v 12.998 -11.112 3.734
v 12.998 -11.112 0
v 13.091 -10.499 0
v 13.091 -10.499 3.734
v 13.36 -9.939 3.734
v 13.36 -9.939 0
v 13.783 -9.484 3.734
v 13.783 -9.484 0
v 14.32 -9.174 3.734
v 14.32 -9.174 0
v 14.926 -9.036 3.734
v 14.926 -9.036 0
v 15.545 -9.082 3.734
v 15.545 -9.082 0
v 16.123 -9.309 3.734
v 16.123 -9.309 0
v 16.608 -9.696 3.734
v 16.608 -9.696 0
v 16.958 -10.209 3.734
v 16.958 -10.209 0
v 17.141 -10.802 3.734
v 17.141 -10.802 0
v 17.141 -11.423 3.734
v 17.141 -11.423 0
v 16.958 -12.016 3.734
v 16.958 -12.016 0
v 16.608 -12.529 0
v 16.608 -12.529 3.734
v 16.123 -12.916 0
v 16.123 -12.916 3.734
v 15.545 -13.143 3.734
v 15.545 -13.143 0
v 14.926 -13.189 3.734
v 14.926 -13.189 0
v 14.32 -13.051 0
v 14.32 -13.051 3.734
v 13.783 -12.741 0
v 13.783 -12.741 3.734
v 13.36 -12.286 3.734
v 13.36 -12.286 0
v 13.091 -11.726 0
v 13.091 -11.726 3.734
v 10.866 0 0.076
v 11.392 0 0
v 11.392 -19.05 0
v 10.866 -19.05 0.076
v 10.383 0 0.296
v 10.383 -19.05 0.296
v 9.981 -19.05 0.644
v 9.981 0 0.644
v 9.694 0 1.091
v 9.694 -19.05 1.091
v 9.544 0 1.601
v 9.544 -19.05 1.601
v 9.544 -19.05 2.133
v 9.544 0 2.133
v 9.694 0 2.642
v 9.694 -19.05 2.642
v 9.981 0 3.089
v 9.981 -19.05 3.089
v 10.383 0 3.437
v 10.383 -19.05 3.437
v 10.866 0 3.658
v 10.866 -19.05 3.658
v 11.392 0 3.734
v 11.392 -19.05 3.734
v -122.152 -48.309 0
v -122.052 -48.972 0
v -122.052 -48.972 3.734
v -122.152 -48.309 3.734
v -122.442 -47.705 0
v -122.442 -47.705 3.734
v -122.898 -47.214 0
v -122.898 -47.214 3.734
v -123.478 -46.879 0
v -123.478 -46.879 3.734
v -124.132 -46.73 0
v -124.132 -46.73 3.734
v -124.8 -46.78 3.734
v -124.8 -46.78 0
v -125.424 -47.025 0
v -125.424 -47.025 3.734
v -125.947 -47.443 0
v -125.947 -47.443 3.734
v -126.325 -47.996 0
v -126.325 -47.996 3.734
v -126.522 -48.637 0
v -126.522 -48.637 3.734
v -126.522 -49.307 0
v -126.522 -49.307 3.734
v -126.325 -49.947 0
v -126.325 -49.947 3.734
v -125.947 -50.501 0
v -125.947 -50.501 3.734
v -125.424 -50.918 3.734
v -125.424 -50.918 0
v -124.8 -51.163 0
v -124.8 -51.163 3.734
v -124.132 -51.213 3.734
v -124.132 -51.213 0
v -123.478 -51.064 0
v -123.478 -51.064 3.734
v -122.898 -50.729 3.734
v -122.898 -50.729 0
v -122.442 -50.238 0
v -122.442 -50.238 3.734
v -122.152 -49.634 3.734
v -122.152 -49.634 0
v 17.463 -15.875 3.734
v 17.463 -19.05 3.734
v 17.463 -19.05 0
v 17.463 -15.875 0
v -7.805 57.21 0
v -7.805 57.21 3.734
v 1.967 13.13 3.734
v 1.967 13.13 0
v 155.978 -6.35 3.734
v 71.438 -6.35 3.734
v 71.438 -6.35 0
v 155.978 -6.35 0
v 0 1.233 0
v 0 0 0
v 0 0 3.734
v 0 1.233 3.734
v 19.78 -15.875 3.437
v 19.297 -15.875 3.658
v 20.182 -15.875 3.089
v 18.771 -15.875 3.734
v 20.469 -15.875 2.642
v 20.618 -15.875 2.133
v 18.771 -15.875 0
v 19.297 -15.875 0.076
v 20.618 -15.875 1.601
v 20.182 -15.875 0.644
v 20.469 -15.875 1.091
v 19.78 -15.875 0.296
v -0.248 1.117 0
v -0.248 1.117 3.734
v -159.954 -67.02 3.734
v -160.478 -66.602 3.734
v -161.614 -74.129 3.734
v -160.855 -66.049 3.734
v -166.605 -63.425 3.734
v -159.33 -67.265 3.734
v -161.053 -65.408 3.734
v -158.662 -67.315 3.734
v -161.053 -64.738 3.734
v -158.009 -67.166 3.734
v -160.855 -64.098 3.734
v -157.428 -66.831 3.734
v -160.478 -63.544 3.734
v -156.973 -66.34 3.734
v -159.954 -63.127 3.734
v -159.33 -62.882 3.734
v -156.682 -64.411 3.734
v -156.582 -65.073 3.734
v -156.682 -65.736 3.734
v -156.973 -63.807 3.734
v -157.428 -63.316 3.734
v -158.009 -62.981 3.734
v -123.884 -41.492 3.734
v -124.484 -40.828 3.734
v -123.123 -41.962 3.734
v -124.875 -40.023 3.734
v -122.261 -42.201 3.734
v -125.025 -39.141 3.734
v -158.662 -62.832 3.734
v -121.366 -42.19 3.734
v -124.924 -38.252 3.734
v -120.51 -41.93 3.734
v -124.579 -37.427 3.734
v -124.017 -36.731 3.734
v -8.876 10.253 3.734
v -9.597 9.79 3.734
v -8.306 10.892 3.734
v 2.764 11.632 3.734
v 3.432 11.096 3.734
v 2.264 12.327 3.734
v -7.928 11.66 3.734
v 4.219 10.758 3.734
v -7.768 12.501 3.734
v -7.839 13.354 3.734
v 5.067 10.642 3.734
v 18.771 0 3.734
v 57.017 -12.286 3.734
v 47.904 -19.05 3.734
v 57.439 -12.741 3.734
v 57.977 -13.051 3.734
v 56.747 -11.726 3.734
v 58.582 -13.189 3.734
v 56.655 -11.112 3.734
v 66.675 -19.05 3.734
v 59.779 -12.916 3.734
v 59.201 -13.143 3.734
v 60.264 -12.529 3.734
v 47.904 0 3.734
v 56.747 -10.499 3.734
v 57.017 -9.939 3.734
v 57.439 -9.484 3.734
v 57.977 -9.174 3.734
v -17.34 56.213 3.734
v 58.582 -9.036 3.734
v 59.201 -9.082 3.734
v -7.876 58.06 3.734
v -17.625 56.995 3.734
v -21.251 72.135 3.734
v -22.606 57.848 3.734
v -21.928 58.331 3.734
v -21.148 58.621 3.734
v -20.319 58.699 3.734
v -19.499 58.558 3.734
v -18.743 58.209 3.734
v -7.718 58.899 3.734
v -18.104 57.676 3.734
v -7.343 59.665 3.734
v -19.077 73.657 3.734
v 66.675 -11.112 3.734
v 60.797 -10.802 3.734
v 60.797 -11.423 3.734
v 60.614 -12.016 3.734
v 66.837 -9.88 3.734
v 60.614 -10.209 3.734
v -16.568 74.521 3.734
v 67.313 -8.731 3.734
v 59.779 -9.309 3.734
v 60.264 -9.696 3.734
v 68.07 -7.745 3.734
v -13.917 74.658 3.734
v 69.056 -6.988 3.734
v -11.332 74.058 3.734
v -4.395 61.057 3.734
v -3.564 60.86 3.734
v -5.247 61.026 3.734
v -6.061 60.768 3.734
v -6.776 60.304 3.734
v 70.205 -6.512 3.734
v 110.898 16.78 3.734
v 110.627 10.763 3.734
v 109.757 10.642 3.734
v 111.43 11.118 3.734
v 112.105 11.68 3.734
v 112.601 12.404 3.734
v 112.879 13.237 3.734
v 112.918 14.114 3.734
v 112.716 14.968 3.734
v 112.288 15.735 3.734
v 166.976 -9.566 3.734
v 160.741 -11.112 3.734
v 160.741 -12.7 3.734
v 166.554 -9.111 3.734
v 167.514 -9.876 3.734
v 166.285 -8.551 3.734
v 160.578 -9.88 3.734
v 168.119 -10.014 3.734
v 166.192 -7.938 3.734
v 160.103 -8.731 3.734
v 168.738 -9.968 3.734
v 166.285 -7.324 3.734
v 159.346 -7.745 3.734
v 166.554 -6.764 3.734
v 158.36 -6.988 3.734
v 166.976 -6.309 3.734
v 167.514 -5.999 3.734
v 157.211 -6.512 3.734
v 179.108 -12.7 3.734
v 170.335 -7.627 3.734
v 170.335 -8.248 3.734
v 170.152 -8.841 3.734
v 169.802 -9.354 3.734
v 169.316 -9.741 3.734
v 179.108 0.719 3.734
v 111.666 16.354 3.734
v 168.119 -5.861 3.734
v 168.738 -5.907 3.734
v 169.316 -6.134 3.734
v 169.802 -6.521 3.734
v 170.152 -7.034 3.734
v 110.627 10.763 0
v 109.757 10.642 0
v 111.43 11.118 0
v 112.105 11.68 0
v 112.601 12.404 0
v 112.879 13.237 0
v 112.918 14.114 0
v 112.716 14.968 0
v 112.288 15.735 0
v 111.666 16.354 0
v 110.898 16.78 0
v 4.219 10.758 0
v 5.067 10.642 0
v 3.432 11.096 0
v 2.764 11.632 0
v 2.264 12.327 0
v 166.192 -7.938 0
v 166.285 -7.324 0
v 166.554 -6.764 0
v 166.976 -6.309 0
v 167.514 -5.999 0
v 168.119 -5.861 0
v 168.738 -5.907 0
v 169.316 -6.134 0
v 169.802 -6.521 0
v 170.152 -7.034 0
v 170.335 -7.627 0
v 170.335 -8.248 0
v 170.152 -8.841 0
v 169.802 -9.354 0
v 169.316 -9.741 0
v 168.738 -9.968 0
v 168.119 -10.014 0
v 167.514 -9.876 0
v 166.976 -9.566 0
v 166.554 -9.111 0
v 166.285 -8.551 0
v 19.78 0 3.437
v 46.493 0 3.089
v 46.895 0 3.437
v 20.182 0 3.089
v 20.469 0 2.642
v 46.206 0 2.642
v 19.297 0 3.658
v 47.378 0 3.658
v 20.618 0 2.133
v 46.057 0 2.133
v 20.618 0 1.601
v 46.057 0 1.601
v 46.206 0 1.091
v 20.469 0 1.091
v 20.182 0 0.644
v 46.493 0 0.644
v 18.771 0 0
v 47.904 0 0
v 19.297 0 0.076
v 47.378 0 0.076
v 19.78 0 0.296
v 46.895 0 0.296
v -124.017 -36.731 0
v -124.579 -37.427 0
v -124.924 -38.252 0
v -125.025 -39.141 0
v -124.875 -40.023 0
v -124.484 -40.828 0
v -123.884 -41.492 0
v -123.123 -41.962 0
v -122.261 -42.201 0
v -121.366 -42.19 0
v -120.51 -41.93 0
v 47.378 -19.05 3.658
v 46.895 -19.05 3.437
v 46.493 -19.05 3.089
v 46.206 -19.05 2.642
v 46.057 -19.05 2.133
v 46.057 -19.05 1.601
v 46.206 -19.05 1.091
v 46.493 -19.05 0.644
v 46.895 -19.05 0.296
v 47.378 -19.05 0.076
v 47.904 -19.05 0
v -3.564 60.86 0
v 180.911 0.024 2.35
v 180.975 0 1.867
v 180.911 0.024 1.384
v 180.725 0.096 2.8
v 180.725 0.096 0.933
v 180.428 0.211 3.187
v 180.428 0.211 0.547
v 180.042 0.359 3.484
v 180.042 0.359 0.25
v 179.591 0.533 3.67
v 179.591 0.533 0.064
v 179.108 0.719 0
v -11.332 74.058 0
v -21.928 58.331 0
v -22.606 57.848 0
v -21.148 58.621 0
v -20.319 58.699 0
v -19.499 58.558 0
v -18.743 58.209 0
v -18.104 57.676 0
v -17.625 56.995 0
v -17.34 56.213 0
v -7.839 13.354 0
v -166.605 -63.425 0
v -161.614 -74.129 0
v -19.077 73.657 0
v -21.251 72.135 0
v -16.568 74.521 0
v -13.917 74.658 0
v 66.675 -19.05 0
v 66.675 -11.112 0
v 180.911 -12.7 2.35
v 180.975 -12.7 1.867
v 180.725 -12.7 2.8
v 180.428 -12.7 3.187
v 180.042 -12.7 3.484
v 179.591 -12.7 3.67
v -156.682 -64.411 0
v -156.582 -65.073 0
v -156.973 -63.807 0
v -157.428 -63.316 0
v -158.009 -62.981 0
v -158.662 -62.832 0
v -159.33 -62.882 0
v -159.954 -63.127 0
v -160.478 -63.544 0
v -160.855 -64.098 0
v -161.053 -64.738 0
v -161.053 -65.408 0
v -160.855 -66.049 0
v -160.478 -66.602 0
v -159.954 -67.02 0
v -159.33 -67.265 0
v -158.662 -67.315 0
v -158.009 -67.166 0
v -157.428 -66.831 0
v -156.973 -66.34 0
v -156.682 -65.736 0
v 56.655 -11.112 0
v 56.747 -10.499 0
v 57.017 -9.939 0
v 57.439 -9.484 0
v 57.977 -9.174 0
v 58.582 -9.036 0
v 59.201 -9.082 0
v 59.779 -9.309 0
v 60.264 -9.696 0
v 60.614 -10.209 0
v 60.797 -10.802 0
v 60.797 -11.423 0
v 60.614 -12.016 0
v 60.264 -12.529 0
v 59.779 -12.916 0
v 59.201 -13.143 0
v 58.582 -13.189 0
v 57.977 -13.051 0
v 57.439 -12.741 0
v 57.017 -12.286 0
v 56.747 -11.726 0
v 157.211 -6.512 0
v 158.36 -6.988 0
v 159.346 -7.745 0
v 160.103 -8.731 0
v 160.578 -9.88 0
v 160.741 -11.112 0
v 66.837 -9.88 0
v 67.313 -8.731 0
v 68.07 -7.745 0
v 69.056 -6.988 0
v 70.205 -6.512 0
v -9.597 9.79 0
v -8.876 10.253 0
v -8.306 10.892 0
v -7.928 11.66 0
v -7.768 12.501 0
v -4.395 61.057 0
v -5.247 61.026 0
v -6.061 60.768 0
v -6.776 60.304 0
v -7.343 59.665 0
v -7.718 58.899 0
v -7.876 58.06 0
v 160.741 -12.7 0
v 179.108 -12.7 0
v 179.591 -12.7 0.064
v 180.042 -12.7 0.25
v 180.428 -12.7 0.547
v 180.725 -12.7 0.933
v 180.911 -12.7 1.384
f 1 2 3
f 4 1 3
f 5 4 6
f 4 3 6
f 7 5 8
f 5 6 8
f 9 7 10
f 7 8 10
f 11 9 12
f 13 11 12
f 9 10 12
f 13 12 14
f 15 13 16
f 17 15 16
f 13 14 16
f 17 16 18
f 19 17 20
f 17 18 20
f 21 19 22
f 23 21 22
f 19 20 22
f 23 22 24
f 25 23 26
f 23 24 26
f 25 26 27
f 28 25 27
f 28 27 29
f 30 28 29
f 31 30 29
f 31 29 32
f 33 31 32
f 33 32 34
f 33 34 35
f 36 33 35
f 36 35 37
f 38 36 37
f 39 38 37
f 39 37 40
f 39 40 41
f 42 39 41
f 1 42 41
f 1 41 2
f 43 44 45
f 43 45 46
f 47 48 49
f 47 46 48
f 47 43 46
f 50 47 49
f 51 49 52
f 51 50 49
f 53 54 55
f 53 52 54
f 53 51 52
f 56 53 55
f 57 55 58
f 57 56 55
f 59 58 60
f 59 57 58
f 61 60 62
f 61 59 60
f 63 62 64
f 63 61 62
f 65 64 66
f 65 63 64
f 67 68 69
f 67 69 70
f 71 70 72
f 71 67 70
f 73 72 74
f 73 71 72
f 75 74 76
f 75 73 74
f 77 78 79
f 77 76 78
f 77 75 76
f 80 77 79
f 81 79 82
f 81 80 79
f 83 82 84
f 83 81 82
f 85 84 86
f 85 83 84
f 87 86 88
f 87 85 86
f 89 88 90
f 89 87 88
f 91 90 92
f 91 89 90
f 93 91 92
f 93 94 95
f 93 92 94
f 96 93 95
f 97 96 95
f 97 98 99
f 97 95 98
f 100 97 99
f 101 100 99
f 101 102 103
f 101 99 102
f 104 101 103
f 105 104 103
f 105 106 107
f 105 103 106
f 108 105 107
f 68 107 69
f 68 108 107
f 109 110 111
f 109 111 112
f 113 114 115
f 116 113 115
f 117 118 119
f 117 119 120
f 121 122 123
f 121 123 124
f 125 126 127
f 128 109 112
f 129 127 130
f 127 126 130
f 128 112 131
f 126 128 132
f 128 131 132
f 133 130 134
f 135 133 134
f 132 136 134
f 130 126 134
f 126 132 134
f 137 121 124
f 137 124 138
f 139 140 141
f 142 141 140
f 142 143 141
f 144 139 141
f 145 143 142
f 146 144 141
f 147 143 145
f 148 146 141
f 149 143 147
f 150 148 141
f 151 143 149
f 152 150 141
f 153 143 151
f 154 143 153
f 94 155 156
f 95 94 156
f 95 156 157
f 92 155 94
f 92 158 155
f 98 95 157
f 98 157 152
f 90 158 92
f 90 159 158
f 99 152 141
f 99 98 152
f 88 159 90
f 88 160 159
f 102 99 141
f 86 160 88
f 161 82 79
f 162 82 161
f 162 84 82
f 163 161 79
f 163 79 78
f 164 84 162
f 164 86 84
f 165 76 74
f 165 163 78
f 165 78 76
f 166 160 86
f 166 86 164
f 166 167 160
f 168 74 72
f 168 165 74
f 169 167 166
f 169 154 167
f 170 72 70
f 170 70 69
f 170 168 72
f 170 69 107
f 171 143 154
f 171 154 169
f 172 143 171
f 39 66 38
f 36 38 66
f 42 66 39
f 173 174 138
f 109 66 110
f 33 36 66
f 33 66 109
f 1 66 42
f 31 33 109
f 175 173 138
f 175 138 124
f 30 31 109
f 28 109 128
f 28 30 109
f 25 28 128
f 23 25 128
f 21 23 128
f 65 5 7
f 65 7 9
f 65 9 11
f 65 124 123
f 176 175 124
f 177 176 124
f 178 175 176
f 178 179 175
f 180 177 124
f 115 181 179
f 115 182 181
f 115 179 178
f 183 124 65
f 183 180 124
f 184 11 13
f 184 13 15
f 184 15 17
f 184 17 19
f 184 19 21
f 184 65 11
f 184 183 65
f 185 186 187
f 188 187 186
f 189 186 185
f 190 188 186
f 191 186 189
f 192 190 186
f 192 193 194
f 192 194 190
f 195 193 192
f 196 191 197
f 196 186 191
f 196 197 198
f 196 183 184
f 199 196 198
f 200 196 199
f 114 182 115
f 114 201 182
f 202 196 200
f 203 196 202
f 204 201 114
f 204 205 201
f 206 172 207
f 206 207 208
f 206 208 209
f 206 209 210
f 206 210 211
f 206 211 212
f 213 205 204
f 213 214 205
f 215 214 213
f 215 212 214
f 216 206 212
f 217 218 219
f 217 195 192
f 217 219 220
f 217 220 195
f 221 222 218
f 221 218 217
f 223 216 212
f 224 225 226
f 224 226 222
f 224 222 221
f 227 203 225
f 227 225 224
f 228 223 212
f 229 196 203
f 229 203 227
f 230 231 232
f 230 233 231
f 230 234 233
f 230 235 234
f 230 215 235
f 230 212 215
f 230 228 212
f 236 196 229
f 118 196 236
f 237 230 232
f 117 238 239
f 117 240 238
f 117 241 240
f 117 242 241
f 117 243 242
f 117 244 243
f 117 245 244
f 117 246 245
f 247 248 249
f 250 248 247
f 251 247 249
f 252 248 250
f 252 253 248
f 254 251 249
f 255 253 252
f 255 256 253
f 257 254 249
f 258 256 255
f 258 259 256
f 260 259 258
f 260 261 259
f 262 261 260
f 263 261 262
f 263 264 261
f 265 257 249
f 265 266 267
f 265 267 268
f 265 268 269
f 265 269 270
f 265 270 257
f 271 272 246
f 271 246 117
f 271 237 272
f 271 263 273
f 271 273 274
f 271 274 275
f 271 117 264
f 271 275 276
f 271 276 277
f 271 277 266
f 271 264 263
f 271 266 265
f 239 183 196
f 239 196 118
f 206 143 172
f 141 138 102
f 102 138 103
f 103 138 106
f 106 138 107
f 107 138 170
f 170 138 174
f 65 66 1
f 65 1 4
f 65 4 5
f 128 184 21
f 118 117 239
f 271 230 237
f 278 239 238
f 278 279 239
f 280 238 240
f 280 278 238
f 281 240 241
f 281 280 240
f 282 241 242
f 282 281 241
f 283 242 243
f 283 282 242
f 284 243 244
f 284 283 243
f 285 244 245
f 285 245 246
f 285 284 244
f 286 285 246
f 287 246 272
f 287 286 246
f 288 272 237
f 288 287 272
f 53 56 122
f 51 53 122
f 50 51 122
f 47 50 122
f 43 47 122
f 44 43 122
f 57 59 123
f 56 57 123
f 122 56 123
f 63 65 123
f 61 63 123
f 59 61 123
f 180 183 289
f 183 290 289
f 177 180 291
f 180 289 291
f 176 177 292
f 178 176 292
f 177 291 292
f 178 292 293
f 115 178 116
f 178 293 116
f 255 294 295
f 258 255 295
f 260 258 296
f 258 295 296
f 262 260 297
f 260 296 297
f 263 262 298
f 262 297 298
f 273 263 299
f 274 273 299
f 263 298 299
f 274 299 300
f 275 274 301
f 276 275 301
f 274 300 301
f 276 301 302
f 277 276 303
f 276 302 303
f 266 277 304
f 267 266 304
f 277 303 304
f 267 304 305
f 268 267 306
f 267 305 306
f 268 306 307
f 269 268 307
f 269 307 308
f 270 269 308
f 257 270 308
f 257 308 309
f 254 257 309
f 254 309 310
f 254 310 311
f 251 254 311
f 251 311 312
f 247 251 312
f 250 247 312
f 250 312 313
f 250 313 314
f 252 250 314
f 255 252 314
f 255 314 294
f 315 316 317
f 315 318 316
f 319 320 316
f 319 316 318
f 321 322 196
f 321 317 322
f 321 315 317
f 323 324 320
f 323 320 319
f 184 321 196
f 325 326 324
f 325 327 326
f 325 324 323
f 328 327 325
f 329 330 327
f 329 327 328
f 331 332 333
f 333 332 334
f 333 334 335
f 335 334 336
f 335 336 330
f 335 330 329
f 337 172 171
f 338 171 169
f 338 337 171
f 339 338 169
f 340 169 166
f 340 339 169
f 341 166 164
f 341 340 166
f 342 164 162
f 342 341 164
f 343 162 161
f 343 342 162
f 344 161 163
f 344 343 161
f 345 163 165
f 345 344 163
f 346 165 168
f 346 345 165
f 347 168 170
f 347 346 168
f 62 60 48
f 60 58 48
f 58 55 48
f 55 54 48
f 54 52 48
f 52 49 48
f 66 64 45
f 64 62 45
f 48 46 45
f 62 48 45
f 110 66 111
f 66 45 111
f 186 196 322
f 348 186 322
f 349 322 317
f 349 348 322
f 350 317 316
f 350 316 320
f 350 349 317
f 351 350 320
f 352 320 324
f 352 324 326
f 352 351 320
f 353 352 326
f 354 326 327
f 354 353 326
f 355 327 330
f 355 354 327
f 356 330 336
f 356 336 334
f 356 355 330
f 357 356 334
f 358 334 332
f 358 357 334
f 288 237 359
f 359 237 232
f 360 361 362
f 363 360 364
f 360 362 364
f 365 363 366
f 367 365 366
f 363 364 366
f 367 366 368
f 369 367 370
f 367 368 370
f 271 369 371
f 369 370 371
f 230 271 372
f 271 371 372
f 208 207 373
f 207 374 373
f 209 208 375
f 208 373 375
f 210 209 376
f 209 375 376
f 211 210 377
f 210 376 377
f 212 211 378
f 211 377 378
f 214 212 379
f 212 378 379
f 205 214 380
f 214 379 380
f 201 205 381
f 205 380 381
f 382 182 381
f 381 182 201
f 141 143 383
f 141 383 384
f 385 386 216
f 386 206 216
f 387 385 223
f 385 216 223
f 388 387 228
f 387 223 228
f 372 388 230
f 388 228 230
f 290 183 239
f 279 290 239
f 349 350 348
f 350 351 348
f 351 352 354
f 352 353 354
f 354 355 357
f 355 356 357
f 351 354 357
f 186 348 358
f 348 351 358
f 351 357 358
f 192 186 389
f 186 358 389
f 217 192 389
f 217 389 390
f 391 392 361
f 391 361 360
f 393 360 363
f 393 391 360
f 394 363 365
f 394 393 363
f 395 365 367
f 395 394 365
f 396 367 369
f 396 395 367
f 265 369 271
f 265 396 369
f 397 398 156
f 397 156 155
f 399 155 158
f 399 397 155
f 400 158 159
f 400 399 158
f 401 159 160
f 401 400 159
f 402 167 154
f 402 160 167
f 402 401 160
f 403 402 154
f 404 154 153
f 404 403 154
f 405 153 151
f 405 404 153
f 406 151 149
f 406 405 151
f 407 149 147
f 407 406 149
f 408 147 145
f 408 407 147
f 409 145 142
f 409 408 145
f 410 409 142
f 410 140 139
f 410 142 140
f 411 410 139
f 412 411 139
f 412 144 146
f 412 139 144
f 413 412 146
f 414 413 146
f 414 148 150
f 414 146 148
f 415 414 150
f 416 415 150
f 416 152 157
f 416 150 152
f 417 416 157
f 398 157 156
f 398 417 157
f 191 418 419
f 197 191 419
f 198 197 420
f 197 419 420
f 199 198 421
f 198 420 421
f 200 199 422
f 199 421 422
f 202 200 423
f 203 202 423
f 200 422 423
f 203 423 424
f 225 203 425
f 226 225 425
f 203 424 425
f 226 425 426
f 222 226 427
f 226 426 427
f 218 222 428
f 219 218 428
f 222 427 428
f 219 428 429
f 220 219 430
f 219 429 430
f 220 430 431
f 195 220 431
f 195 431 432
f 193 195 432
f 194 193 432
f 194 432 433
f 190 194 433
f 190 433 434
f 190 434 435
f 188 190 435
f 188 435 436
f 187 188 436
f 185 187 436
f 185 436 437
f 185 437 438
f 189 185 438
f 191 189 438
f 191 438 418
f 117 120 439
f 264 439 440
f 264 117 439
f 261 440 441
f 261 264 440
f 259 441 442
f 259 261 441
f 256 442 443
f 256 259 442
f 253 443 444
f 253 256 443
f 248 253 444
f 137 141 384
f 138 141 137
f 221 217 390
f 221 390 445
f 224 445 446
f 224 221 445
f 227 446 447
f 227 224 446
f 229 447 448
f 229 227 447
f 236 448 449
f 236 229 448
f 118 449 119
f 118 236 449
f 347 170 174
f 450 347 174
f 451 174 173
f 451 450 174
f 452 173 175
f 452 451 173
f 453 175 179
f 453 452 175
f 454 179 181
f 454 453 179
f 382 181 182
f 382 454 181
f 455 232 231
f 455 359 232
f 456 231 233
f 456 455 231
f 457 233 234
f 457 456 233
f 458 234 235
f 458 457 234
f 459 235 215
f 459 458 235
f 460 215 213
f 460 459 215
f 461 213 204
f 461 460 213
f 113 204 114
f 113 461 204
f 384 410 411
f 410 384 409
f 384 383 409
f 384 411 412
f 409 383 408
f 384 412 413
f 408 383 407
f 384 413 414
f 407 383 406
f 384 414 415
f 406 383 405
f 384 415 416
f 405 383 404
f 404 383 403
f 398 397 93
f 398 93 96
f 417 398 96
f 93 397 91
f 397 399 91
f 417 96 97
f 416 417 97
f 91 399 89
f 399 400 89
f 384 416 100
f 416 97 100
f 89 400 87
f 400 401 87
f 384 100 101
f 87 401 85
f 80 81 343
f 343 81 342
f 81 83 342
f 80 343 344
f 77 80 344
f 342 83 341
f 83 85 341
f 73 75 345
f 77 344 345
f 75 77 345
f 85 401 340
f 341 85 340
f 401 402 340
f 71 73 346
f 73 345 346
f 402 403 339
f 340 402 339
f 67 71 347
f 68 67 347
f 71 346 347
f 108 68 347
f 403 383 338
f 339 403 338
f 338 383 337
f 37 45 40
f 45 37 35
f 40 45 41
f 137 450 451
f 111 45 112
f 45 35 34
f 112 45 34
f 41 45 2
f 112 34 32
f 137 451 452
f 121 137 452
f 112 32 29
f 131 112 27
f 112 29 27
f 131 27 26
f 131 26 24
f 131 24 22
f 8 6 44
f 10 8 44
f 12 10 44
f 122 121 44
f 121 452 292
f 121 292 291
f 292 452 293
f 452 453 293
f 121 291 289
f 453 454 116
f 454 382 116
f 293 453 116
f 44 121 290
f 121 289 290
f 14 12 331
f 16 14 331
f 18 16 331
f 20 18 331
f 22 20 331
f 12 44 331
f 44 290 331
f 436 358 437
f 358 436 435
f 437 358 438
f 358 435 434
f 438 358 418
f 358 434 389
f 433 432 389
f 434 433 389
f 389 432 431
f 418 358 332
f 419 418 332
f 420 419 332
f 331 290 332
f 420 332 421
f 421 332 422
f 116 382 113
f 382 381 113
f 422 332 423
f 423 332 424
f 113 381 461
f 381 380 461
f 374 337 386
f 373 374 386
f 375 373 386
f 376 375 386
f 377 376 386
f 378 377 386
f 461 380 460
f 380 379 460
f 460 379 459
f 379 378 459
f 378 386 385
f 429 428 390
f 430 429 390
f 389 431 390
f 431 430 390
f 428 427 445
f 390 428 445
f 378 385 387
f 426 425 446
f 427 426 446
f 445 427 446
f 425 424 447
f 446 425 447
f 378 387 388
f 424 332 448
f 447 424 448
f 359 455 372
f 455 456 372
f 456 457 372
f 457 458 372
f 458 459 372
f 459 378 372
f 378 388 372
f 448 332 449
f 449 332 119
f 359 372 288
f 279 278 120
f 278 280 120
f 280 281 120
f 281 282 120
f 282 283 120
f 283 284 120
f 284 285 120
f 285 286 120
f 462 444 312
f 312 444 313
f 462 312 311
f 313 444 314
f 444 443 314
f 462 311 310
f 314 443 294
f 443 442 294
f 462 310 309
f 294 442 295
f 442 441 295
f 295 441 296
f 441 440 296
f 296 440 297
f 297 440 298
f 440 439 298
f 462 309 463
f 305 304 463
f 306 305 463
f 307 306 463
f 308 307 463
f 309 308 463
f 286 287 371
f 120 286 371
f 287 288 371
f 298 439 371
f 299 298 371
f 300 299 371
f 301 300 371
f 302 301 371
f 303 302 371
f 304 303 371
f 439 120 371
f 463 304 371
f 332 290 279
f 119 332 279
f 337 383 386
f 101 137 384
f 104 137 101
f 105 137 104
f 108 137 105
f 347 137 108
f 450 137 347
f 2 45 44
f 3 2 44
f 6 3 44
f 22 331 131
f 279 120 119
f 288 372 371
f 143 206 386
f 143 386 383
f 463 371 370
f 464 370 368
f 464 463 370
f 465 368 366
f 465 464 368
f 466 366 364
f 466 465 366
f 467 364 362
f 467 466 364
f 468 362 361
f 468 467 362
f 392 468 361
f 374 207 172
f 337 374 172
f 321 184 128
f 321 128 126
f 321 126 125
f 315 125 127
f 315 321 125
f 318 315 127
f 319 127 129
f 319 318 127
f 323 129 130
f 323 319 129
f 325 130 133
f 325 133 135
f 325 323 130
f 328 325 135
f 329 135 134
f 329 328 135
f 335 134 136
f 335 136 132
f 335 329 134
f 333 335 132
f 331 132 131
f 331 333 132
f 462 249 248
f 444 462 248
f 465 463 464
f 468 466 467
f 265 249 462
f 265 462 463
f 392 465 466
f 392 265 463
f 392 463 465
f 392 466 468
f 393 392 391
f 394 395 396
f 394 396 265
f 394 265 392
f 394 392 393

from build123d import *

# Parameters (mm, degrees)
BOSS_EXTRUDE1_DEPTH     = 3.7338
BOSS_EXTRUDE2_DEPTH     = 3.7338
CUT_EXTRUDE1_DEPTH      = 197.398400929
FILLET7_R               = 9.525
FILLET8_R               = 3.175
F_8_32_TAPPED_HOLE2_D   = 4.1656
FILLET3_RADIUS          = 1.8669
FILLET3_LENGTH          = 19.05
FILLET4_RADIUS          = 1.8669
FILLET4_LENGTH          = 19.05
FILLET5_RADIUS          = 1.8669
FILLET5_LENGTH          = 19.05
FILLET6_START           = -20
FILLET6_DEPTH           = 22
CUT_EXTRUDE2_START      = -5
CUT_EXTRUDE2_OUTLINE_R  = 2.2479
CUT_EXTRUDE2_DEPTH      = 6
CUT_EXTRUDE3_DEPTH      = 196.819265209
SKETCH15_W              = 94.065777876
SKETCH15_H              = 7.9375
CUT_EXTRUDE4_DEPTH      = 196.819265209
SKETCH16_W              = 20.234222124
SKETCH16_H              = 6.35
CUT_EXTRUDE5_DEPTH      = 196.819265209
CUT_EXTRUDE6_DEPTH      = 196.819265209
CUT_EXTRUDE6_DEPTH_BACK = 196.819265209
SKETCH17_W              = 3.175
SKETCH17_H              = 3.175


with BuildPart() as part:
    # Sketch1 → Boss-Extrude1 (new body)
    with BuildSketch(Plane.XY):
        Polygon((0, 0), (9.525, 0), (9.525, -19.05), (20.6375, -19.05), (20.6375, 0), (46.0375, 0), (46.0375, -19.05), (180.975, -19.05), (180.975, 0), (-16.893133293, 76.2), align=None)
    extrude(amount=BOSS_EXTRUDE1_DEPTH)

    # Sketch7 → Boss-Extrude2 (add)
    with BuildSketch(Plane.XY.offset(3.7338)):
        Polygon((-161.613635382, -74.129081959), (-0.247657199, 1.117109433), (-16.893133293, 76.2), (-166.605179671, -63.424680687), align=None)
    extrude(amount=-BOSS_EXTRUDE2_DEPTH)

    # Sketch8 → Cut-Extrude1 (cut, through all)
    with BuildSketch(Plane.XY.offset(3.7338)):
        Polygon((2.518832326, 10.642109433), (126.836493994, 10.642109433), (-9.085614858, 62.98638803), align=None)
        Polygon((-18.542737866, 61.637057548), (-138.674453357, -50.400369109), (-7.28718114, 10.86652211), align=None)
    extrude(amount=-CUT_EXTRUDE1_DEPTH, mode=Mode.SUBTRACT)

    # Fillet7
    fillet7_edges = [part.edges().sort_by_distance(p)[0] for p in [
        (-16.893133293, 76.2, 1.8669),
    ]]
    fillet(fillet7_edges, radius=FILLET7_R)

    # Fillet8
    fillet8_edges = [part.edges().sort_by_distance(p)[0] for p in [
        (-9.085614858, 62.98638803, 1.8669),
        (126.836493994, 10.642109433, 1.8669),
        (2.518832326, 10.642109433, 1.8669),
        (-7.28718114, 10.86652211, 1.8669),
        (-138.674453357, -50.400369109, 1.8669),
        (-18.542737866, 61.637057548, 1.8669),
    ]]
    fillet(fillet8_edges, radius=FILLET8_R)

    # #8-32 Tapped Hole2 (through all)
    with Locations(Plane.XY.offset(3.7338)):
        with Locations((15.08125, -11.1125), (58.7375, -11.1125), (168.275, -7.9375)):
            Hole(F_8_32_TAPPED_HOLE2_D / 2)

    # Fillet3: full round fillet: the end face becomes a half cylinder, R = half its width
    fillet3_face = Plane((9.525, -9.525, 1.8669), x_dir=(0, 1, 0), z_dir=(-1, 0, 0))  # on the end face: x along it, z out of the body
    fillet3_slab = fillet3_face.offset(-FILLET3_RADIUS / 2) * Box(FILLET3_LENGTH, 2 * FILLET3_RADIUS, FILLET3_RADIUS, mode=Mode.PRIVATE)  # the body's end, R deep
    fillet3_round = Plane((11.3919, -9.525, 1.8669), x_dir=(-1, 0, 0), z_dir=(0, 1, 0)) * Cylinder(FILLET3_RADIUS, FILLET3_LENGTH, mode=Mode.PRIVATE)  # its axis R under the face
    add(fillet3_slab - fillet3_round, mode=Mode.SUBTRACT)

    # Fillet4: full round fillet: the end face becomes a half cylinder, R = half its width
    fillet4_face = Plane((20.6375, -9.525, 1.8669), x_dir=(0, 1, 0), z_dir=(1, 0, 0))  # on the end face: x along it, z out of the body
    fillet4_slab = fillet4_face.offset(-FILLET4_RADIUS / 2) * Box(FILLET4_LENGTH, 2 * FILLET4_RADIUS, FILLET4_RADIUS, mode=Mode.PRIVATE)  # the body's end, R deep
    fillet4_round = Plane((18.7706, -9.525, 1.8669), x_dir=(1, 0, 0), z_dir=(0, 1, 0)) * Cylinder(FILLET4_RADIUS, FILLET4_LENGTH, mode=Mode.PRIVATE)  # its axis R under the face
    add(fillet4_slab - fillet4_round, mode=Mode.SUBTRACT)

    # Fillet5: full round fillet: the end face becomes a half cylinder, R = half its width
    fillet5_face = Plane((46.0375, -9.525, 1.8669), x_dir=(0, -1, 0), z_dir=(-1, 0, 0))  # on the end face: x along it, z out of the body
    fillet5_slab = fillet5_face.offset(-FILLET5_RADIUS / 2) * Box(FILLET5_LENGTH, 2 * FILLET5_RADIUS, FILLET5_RADIUS, mode=Mode.PRIVATE)  # the body's end, R deep
    fillet5_round = Plane((47.9044, -9.525, 1.8669), x_dir=(-1, 0, 0), z_dir=(0, -1, 0)) * Cylinder(FILLET5_RADIUS, FILLET5_LENGTH, mode=Mode.PRIVATE)  # its axis R under the face
    add(fillet5_slab - fillet5_round, mode=Mode.SUBTRACT)

    # Fillet6: read off the stored shape, not the designer's step
    # Fillet6 outline → Fillet6 (cut)
    with BuildSketch(Plane(origin=(0, 0, 0), x_dir=(1, 0, 0), z_dir=(0, 1, 0)).offset(FILLET6_START)):
        with BuildLine():
            ThreePointArc((179.1081, 0), (180.42819765, -0.54680235), (180.975, -1.8669))
            Line((180.975, -1.8669), (180.975, 0))
            Line((180.975, 0), (179.1081, 0))
        make_face()
        with BuildLine():
            ThreePointArc((180.975, -1.8669), (180.42819765, -3.18699765), (179.1081, -3.7338))
            Line((179.1081, -3.7338), (180.975, -3.7338))
            Line((180.975, -3.7338), (180.975, -1.8669))
        make_face()
    extrude(amount=FILLET6_DEPTH, mode=Mode.SUBTRACT)

    # Cut-Extrude2: read off the stored shape, not the designer's step
    # Cut-Extrude2 outline → Cut-Extrude2 (cut)
    with BuildSketch(Plane.XY.offset(3.7338).offset(CUT_EXTRUDE2_START)):
        with Locations((-124.299564913, -48.97170394)):
            Circle(CUT_EXTRUDE2_OUTLINE_R)
        with Locations((-158.829891599, -65.073459713)):
            Circle(CUT_EXTRUDE2_OUTLINE_R)
        Polygon((-0.247657199, 1.117109433), (0, 0), (0, 1.232593882), align=None)
    extrude(amount=CUT_EXTRUDE2_DEPTH, mode=Mode.SUBTRACT)

    # Sketch14 → Cut-Extrude3 (cut, through all)
    with BuildSketch(Plane.XY.offset(3.7338)):
        with BuildLine():
            Line((71.4375, -6.35), (155.978277876, -6.35))
            ThreePointArc((155.978277876, -6.35), (160.740777876, -11.1125), (155.978277876, -15.875))
            Line((155.978277876, -15.875), (71.4375, -15.875))
            ThreePointArc((71.4375, -15.875), (66.675, -11.1125), (71.4375, -6.35))
        make_face()
    extrude(amount=-CUT_EXTRUDE3_DEPTH, mode=Mode.SUBTRACT)

    # Sketch15 → Cut-Extrude4 (cut, through all)
    with BuildSketch(Plane.XY.offset(3.7338)):
        with Locations((113.707888938, -15.08125)):
            Rectangle(SKETCH15_W, SKETCH15_H)
    extrude(amount=-CUT_EXTRUDE4_DEPTH, mode=Mode.SUBTRACT)

    # Sketch16 → Cut-Extrude5 (cut, through all)
    with BuildSketch(Plane.XY.offset(3.7338)):
        with Locations((170.857888938, -15.875)):
            Rectangle(SKETCH16_W, SKETCH16_H)
    extrude(amount=-CUT_EXTRUDE5_DEPTH, mode=Mode.SUBTRACT)

    # Sketch17 → Cut-Extrude6 (cut, two sides: drawn at the far end of the back side and taken through both)
    with BuildSketch(Plane.XY.offset(3.7338).offset(-CUT_EXTRUDE6_DEPTH_BACK)):
        with Locations((19.05, -17.4625)):
            Rectangle(SKETCH17_W, SKETCH17_H)
    extrude(amount=CUT_EXTRUDE6_DEPTH + CUT_EXTRUDE6_DEPTH_BACK, mode=Mode.SUBTRACT)


solid = part.part
